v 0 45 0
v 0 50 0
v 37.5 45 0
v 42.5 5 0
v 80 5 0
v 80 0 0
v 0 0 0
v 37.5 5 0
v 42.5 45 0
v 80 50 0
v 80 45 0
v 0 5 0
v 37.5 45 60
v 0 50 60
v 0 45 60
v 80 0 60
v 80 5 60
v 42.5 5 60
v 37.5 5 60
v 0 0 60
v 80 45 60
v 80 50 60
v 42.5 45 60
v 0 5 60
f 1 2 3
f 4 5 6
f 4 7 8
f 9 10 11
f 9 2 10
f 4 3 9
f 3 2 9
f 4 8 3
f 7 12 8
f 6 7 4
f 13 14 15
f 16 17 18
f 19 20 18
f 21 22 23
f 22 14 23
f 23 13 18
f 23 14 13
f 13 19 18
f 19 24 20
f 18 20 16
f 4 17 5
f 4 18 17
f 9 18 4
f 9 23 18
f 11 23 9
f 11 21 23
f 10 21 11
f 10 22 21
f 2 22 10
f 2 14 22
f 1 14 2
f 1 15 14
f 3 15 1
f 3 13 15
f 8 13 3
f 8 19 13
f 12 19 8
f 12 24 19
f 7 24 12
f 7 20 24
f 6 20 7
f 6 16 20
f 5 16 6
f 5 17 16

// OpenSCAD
$fn = 32;

// ----------------------------------------------------------------------
// Structural section: ibeam 80 x 50 mm
// ----------------------------------------------------------------------

// --- parameters (mm) ---
sec_w = 80;               // section width, X
sec_h = 50;               // section height, Y
flange_t = 5;             // flange thickness
web_t = 5;                // web thickness
plate_t = 60;             // cut length, Z (extrusion height)
fit_tol = 0.05;           // declared fit tolerance (prompt contract)
free_tol = 0.2;           // declared free tolerance (prompt contract)

profile = [[0, 0], [80, 0], [80, 5], [42.5, 5], [42.5, 45], [80, 45], [80, 50], [0, 50], [0, 45], [37.5, 45], [37.5, 5], [0, 5]];  // primary outline, 12 points, counter clockwise

// --- the one profile operation ---
linear_extrude(height = plate_t) polygon(points = profile);
